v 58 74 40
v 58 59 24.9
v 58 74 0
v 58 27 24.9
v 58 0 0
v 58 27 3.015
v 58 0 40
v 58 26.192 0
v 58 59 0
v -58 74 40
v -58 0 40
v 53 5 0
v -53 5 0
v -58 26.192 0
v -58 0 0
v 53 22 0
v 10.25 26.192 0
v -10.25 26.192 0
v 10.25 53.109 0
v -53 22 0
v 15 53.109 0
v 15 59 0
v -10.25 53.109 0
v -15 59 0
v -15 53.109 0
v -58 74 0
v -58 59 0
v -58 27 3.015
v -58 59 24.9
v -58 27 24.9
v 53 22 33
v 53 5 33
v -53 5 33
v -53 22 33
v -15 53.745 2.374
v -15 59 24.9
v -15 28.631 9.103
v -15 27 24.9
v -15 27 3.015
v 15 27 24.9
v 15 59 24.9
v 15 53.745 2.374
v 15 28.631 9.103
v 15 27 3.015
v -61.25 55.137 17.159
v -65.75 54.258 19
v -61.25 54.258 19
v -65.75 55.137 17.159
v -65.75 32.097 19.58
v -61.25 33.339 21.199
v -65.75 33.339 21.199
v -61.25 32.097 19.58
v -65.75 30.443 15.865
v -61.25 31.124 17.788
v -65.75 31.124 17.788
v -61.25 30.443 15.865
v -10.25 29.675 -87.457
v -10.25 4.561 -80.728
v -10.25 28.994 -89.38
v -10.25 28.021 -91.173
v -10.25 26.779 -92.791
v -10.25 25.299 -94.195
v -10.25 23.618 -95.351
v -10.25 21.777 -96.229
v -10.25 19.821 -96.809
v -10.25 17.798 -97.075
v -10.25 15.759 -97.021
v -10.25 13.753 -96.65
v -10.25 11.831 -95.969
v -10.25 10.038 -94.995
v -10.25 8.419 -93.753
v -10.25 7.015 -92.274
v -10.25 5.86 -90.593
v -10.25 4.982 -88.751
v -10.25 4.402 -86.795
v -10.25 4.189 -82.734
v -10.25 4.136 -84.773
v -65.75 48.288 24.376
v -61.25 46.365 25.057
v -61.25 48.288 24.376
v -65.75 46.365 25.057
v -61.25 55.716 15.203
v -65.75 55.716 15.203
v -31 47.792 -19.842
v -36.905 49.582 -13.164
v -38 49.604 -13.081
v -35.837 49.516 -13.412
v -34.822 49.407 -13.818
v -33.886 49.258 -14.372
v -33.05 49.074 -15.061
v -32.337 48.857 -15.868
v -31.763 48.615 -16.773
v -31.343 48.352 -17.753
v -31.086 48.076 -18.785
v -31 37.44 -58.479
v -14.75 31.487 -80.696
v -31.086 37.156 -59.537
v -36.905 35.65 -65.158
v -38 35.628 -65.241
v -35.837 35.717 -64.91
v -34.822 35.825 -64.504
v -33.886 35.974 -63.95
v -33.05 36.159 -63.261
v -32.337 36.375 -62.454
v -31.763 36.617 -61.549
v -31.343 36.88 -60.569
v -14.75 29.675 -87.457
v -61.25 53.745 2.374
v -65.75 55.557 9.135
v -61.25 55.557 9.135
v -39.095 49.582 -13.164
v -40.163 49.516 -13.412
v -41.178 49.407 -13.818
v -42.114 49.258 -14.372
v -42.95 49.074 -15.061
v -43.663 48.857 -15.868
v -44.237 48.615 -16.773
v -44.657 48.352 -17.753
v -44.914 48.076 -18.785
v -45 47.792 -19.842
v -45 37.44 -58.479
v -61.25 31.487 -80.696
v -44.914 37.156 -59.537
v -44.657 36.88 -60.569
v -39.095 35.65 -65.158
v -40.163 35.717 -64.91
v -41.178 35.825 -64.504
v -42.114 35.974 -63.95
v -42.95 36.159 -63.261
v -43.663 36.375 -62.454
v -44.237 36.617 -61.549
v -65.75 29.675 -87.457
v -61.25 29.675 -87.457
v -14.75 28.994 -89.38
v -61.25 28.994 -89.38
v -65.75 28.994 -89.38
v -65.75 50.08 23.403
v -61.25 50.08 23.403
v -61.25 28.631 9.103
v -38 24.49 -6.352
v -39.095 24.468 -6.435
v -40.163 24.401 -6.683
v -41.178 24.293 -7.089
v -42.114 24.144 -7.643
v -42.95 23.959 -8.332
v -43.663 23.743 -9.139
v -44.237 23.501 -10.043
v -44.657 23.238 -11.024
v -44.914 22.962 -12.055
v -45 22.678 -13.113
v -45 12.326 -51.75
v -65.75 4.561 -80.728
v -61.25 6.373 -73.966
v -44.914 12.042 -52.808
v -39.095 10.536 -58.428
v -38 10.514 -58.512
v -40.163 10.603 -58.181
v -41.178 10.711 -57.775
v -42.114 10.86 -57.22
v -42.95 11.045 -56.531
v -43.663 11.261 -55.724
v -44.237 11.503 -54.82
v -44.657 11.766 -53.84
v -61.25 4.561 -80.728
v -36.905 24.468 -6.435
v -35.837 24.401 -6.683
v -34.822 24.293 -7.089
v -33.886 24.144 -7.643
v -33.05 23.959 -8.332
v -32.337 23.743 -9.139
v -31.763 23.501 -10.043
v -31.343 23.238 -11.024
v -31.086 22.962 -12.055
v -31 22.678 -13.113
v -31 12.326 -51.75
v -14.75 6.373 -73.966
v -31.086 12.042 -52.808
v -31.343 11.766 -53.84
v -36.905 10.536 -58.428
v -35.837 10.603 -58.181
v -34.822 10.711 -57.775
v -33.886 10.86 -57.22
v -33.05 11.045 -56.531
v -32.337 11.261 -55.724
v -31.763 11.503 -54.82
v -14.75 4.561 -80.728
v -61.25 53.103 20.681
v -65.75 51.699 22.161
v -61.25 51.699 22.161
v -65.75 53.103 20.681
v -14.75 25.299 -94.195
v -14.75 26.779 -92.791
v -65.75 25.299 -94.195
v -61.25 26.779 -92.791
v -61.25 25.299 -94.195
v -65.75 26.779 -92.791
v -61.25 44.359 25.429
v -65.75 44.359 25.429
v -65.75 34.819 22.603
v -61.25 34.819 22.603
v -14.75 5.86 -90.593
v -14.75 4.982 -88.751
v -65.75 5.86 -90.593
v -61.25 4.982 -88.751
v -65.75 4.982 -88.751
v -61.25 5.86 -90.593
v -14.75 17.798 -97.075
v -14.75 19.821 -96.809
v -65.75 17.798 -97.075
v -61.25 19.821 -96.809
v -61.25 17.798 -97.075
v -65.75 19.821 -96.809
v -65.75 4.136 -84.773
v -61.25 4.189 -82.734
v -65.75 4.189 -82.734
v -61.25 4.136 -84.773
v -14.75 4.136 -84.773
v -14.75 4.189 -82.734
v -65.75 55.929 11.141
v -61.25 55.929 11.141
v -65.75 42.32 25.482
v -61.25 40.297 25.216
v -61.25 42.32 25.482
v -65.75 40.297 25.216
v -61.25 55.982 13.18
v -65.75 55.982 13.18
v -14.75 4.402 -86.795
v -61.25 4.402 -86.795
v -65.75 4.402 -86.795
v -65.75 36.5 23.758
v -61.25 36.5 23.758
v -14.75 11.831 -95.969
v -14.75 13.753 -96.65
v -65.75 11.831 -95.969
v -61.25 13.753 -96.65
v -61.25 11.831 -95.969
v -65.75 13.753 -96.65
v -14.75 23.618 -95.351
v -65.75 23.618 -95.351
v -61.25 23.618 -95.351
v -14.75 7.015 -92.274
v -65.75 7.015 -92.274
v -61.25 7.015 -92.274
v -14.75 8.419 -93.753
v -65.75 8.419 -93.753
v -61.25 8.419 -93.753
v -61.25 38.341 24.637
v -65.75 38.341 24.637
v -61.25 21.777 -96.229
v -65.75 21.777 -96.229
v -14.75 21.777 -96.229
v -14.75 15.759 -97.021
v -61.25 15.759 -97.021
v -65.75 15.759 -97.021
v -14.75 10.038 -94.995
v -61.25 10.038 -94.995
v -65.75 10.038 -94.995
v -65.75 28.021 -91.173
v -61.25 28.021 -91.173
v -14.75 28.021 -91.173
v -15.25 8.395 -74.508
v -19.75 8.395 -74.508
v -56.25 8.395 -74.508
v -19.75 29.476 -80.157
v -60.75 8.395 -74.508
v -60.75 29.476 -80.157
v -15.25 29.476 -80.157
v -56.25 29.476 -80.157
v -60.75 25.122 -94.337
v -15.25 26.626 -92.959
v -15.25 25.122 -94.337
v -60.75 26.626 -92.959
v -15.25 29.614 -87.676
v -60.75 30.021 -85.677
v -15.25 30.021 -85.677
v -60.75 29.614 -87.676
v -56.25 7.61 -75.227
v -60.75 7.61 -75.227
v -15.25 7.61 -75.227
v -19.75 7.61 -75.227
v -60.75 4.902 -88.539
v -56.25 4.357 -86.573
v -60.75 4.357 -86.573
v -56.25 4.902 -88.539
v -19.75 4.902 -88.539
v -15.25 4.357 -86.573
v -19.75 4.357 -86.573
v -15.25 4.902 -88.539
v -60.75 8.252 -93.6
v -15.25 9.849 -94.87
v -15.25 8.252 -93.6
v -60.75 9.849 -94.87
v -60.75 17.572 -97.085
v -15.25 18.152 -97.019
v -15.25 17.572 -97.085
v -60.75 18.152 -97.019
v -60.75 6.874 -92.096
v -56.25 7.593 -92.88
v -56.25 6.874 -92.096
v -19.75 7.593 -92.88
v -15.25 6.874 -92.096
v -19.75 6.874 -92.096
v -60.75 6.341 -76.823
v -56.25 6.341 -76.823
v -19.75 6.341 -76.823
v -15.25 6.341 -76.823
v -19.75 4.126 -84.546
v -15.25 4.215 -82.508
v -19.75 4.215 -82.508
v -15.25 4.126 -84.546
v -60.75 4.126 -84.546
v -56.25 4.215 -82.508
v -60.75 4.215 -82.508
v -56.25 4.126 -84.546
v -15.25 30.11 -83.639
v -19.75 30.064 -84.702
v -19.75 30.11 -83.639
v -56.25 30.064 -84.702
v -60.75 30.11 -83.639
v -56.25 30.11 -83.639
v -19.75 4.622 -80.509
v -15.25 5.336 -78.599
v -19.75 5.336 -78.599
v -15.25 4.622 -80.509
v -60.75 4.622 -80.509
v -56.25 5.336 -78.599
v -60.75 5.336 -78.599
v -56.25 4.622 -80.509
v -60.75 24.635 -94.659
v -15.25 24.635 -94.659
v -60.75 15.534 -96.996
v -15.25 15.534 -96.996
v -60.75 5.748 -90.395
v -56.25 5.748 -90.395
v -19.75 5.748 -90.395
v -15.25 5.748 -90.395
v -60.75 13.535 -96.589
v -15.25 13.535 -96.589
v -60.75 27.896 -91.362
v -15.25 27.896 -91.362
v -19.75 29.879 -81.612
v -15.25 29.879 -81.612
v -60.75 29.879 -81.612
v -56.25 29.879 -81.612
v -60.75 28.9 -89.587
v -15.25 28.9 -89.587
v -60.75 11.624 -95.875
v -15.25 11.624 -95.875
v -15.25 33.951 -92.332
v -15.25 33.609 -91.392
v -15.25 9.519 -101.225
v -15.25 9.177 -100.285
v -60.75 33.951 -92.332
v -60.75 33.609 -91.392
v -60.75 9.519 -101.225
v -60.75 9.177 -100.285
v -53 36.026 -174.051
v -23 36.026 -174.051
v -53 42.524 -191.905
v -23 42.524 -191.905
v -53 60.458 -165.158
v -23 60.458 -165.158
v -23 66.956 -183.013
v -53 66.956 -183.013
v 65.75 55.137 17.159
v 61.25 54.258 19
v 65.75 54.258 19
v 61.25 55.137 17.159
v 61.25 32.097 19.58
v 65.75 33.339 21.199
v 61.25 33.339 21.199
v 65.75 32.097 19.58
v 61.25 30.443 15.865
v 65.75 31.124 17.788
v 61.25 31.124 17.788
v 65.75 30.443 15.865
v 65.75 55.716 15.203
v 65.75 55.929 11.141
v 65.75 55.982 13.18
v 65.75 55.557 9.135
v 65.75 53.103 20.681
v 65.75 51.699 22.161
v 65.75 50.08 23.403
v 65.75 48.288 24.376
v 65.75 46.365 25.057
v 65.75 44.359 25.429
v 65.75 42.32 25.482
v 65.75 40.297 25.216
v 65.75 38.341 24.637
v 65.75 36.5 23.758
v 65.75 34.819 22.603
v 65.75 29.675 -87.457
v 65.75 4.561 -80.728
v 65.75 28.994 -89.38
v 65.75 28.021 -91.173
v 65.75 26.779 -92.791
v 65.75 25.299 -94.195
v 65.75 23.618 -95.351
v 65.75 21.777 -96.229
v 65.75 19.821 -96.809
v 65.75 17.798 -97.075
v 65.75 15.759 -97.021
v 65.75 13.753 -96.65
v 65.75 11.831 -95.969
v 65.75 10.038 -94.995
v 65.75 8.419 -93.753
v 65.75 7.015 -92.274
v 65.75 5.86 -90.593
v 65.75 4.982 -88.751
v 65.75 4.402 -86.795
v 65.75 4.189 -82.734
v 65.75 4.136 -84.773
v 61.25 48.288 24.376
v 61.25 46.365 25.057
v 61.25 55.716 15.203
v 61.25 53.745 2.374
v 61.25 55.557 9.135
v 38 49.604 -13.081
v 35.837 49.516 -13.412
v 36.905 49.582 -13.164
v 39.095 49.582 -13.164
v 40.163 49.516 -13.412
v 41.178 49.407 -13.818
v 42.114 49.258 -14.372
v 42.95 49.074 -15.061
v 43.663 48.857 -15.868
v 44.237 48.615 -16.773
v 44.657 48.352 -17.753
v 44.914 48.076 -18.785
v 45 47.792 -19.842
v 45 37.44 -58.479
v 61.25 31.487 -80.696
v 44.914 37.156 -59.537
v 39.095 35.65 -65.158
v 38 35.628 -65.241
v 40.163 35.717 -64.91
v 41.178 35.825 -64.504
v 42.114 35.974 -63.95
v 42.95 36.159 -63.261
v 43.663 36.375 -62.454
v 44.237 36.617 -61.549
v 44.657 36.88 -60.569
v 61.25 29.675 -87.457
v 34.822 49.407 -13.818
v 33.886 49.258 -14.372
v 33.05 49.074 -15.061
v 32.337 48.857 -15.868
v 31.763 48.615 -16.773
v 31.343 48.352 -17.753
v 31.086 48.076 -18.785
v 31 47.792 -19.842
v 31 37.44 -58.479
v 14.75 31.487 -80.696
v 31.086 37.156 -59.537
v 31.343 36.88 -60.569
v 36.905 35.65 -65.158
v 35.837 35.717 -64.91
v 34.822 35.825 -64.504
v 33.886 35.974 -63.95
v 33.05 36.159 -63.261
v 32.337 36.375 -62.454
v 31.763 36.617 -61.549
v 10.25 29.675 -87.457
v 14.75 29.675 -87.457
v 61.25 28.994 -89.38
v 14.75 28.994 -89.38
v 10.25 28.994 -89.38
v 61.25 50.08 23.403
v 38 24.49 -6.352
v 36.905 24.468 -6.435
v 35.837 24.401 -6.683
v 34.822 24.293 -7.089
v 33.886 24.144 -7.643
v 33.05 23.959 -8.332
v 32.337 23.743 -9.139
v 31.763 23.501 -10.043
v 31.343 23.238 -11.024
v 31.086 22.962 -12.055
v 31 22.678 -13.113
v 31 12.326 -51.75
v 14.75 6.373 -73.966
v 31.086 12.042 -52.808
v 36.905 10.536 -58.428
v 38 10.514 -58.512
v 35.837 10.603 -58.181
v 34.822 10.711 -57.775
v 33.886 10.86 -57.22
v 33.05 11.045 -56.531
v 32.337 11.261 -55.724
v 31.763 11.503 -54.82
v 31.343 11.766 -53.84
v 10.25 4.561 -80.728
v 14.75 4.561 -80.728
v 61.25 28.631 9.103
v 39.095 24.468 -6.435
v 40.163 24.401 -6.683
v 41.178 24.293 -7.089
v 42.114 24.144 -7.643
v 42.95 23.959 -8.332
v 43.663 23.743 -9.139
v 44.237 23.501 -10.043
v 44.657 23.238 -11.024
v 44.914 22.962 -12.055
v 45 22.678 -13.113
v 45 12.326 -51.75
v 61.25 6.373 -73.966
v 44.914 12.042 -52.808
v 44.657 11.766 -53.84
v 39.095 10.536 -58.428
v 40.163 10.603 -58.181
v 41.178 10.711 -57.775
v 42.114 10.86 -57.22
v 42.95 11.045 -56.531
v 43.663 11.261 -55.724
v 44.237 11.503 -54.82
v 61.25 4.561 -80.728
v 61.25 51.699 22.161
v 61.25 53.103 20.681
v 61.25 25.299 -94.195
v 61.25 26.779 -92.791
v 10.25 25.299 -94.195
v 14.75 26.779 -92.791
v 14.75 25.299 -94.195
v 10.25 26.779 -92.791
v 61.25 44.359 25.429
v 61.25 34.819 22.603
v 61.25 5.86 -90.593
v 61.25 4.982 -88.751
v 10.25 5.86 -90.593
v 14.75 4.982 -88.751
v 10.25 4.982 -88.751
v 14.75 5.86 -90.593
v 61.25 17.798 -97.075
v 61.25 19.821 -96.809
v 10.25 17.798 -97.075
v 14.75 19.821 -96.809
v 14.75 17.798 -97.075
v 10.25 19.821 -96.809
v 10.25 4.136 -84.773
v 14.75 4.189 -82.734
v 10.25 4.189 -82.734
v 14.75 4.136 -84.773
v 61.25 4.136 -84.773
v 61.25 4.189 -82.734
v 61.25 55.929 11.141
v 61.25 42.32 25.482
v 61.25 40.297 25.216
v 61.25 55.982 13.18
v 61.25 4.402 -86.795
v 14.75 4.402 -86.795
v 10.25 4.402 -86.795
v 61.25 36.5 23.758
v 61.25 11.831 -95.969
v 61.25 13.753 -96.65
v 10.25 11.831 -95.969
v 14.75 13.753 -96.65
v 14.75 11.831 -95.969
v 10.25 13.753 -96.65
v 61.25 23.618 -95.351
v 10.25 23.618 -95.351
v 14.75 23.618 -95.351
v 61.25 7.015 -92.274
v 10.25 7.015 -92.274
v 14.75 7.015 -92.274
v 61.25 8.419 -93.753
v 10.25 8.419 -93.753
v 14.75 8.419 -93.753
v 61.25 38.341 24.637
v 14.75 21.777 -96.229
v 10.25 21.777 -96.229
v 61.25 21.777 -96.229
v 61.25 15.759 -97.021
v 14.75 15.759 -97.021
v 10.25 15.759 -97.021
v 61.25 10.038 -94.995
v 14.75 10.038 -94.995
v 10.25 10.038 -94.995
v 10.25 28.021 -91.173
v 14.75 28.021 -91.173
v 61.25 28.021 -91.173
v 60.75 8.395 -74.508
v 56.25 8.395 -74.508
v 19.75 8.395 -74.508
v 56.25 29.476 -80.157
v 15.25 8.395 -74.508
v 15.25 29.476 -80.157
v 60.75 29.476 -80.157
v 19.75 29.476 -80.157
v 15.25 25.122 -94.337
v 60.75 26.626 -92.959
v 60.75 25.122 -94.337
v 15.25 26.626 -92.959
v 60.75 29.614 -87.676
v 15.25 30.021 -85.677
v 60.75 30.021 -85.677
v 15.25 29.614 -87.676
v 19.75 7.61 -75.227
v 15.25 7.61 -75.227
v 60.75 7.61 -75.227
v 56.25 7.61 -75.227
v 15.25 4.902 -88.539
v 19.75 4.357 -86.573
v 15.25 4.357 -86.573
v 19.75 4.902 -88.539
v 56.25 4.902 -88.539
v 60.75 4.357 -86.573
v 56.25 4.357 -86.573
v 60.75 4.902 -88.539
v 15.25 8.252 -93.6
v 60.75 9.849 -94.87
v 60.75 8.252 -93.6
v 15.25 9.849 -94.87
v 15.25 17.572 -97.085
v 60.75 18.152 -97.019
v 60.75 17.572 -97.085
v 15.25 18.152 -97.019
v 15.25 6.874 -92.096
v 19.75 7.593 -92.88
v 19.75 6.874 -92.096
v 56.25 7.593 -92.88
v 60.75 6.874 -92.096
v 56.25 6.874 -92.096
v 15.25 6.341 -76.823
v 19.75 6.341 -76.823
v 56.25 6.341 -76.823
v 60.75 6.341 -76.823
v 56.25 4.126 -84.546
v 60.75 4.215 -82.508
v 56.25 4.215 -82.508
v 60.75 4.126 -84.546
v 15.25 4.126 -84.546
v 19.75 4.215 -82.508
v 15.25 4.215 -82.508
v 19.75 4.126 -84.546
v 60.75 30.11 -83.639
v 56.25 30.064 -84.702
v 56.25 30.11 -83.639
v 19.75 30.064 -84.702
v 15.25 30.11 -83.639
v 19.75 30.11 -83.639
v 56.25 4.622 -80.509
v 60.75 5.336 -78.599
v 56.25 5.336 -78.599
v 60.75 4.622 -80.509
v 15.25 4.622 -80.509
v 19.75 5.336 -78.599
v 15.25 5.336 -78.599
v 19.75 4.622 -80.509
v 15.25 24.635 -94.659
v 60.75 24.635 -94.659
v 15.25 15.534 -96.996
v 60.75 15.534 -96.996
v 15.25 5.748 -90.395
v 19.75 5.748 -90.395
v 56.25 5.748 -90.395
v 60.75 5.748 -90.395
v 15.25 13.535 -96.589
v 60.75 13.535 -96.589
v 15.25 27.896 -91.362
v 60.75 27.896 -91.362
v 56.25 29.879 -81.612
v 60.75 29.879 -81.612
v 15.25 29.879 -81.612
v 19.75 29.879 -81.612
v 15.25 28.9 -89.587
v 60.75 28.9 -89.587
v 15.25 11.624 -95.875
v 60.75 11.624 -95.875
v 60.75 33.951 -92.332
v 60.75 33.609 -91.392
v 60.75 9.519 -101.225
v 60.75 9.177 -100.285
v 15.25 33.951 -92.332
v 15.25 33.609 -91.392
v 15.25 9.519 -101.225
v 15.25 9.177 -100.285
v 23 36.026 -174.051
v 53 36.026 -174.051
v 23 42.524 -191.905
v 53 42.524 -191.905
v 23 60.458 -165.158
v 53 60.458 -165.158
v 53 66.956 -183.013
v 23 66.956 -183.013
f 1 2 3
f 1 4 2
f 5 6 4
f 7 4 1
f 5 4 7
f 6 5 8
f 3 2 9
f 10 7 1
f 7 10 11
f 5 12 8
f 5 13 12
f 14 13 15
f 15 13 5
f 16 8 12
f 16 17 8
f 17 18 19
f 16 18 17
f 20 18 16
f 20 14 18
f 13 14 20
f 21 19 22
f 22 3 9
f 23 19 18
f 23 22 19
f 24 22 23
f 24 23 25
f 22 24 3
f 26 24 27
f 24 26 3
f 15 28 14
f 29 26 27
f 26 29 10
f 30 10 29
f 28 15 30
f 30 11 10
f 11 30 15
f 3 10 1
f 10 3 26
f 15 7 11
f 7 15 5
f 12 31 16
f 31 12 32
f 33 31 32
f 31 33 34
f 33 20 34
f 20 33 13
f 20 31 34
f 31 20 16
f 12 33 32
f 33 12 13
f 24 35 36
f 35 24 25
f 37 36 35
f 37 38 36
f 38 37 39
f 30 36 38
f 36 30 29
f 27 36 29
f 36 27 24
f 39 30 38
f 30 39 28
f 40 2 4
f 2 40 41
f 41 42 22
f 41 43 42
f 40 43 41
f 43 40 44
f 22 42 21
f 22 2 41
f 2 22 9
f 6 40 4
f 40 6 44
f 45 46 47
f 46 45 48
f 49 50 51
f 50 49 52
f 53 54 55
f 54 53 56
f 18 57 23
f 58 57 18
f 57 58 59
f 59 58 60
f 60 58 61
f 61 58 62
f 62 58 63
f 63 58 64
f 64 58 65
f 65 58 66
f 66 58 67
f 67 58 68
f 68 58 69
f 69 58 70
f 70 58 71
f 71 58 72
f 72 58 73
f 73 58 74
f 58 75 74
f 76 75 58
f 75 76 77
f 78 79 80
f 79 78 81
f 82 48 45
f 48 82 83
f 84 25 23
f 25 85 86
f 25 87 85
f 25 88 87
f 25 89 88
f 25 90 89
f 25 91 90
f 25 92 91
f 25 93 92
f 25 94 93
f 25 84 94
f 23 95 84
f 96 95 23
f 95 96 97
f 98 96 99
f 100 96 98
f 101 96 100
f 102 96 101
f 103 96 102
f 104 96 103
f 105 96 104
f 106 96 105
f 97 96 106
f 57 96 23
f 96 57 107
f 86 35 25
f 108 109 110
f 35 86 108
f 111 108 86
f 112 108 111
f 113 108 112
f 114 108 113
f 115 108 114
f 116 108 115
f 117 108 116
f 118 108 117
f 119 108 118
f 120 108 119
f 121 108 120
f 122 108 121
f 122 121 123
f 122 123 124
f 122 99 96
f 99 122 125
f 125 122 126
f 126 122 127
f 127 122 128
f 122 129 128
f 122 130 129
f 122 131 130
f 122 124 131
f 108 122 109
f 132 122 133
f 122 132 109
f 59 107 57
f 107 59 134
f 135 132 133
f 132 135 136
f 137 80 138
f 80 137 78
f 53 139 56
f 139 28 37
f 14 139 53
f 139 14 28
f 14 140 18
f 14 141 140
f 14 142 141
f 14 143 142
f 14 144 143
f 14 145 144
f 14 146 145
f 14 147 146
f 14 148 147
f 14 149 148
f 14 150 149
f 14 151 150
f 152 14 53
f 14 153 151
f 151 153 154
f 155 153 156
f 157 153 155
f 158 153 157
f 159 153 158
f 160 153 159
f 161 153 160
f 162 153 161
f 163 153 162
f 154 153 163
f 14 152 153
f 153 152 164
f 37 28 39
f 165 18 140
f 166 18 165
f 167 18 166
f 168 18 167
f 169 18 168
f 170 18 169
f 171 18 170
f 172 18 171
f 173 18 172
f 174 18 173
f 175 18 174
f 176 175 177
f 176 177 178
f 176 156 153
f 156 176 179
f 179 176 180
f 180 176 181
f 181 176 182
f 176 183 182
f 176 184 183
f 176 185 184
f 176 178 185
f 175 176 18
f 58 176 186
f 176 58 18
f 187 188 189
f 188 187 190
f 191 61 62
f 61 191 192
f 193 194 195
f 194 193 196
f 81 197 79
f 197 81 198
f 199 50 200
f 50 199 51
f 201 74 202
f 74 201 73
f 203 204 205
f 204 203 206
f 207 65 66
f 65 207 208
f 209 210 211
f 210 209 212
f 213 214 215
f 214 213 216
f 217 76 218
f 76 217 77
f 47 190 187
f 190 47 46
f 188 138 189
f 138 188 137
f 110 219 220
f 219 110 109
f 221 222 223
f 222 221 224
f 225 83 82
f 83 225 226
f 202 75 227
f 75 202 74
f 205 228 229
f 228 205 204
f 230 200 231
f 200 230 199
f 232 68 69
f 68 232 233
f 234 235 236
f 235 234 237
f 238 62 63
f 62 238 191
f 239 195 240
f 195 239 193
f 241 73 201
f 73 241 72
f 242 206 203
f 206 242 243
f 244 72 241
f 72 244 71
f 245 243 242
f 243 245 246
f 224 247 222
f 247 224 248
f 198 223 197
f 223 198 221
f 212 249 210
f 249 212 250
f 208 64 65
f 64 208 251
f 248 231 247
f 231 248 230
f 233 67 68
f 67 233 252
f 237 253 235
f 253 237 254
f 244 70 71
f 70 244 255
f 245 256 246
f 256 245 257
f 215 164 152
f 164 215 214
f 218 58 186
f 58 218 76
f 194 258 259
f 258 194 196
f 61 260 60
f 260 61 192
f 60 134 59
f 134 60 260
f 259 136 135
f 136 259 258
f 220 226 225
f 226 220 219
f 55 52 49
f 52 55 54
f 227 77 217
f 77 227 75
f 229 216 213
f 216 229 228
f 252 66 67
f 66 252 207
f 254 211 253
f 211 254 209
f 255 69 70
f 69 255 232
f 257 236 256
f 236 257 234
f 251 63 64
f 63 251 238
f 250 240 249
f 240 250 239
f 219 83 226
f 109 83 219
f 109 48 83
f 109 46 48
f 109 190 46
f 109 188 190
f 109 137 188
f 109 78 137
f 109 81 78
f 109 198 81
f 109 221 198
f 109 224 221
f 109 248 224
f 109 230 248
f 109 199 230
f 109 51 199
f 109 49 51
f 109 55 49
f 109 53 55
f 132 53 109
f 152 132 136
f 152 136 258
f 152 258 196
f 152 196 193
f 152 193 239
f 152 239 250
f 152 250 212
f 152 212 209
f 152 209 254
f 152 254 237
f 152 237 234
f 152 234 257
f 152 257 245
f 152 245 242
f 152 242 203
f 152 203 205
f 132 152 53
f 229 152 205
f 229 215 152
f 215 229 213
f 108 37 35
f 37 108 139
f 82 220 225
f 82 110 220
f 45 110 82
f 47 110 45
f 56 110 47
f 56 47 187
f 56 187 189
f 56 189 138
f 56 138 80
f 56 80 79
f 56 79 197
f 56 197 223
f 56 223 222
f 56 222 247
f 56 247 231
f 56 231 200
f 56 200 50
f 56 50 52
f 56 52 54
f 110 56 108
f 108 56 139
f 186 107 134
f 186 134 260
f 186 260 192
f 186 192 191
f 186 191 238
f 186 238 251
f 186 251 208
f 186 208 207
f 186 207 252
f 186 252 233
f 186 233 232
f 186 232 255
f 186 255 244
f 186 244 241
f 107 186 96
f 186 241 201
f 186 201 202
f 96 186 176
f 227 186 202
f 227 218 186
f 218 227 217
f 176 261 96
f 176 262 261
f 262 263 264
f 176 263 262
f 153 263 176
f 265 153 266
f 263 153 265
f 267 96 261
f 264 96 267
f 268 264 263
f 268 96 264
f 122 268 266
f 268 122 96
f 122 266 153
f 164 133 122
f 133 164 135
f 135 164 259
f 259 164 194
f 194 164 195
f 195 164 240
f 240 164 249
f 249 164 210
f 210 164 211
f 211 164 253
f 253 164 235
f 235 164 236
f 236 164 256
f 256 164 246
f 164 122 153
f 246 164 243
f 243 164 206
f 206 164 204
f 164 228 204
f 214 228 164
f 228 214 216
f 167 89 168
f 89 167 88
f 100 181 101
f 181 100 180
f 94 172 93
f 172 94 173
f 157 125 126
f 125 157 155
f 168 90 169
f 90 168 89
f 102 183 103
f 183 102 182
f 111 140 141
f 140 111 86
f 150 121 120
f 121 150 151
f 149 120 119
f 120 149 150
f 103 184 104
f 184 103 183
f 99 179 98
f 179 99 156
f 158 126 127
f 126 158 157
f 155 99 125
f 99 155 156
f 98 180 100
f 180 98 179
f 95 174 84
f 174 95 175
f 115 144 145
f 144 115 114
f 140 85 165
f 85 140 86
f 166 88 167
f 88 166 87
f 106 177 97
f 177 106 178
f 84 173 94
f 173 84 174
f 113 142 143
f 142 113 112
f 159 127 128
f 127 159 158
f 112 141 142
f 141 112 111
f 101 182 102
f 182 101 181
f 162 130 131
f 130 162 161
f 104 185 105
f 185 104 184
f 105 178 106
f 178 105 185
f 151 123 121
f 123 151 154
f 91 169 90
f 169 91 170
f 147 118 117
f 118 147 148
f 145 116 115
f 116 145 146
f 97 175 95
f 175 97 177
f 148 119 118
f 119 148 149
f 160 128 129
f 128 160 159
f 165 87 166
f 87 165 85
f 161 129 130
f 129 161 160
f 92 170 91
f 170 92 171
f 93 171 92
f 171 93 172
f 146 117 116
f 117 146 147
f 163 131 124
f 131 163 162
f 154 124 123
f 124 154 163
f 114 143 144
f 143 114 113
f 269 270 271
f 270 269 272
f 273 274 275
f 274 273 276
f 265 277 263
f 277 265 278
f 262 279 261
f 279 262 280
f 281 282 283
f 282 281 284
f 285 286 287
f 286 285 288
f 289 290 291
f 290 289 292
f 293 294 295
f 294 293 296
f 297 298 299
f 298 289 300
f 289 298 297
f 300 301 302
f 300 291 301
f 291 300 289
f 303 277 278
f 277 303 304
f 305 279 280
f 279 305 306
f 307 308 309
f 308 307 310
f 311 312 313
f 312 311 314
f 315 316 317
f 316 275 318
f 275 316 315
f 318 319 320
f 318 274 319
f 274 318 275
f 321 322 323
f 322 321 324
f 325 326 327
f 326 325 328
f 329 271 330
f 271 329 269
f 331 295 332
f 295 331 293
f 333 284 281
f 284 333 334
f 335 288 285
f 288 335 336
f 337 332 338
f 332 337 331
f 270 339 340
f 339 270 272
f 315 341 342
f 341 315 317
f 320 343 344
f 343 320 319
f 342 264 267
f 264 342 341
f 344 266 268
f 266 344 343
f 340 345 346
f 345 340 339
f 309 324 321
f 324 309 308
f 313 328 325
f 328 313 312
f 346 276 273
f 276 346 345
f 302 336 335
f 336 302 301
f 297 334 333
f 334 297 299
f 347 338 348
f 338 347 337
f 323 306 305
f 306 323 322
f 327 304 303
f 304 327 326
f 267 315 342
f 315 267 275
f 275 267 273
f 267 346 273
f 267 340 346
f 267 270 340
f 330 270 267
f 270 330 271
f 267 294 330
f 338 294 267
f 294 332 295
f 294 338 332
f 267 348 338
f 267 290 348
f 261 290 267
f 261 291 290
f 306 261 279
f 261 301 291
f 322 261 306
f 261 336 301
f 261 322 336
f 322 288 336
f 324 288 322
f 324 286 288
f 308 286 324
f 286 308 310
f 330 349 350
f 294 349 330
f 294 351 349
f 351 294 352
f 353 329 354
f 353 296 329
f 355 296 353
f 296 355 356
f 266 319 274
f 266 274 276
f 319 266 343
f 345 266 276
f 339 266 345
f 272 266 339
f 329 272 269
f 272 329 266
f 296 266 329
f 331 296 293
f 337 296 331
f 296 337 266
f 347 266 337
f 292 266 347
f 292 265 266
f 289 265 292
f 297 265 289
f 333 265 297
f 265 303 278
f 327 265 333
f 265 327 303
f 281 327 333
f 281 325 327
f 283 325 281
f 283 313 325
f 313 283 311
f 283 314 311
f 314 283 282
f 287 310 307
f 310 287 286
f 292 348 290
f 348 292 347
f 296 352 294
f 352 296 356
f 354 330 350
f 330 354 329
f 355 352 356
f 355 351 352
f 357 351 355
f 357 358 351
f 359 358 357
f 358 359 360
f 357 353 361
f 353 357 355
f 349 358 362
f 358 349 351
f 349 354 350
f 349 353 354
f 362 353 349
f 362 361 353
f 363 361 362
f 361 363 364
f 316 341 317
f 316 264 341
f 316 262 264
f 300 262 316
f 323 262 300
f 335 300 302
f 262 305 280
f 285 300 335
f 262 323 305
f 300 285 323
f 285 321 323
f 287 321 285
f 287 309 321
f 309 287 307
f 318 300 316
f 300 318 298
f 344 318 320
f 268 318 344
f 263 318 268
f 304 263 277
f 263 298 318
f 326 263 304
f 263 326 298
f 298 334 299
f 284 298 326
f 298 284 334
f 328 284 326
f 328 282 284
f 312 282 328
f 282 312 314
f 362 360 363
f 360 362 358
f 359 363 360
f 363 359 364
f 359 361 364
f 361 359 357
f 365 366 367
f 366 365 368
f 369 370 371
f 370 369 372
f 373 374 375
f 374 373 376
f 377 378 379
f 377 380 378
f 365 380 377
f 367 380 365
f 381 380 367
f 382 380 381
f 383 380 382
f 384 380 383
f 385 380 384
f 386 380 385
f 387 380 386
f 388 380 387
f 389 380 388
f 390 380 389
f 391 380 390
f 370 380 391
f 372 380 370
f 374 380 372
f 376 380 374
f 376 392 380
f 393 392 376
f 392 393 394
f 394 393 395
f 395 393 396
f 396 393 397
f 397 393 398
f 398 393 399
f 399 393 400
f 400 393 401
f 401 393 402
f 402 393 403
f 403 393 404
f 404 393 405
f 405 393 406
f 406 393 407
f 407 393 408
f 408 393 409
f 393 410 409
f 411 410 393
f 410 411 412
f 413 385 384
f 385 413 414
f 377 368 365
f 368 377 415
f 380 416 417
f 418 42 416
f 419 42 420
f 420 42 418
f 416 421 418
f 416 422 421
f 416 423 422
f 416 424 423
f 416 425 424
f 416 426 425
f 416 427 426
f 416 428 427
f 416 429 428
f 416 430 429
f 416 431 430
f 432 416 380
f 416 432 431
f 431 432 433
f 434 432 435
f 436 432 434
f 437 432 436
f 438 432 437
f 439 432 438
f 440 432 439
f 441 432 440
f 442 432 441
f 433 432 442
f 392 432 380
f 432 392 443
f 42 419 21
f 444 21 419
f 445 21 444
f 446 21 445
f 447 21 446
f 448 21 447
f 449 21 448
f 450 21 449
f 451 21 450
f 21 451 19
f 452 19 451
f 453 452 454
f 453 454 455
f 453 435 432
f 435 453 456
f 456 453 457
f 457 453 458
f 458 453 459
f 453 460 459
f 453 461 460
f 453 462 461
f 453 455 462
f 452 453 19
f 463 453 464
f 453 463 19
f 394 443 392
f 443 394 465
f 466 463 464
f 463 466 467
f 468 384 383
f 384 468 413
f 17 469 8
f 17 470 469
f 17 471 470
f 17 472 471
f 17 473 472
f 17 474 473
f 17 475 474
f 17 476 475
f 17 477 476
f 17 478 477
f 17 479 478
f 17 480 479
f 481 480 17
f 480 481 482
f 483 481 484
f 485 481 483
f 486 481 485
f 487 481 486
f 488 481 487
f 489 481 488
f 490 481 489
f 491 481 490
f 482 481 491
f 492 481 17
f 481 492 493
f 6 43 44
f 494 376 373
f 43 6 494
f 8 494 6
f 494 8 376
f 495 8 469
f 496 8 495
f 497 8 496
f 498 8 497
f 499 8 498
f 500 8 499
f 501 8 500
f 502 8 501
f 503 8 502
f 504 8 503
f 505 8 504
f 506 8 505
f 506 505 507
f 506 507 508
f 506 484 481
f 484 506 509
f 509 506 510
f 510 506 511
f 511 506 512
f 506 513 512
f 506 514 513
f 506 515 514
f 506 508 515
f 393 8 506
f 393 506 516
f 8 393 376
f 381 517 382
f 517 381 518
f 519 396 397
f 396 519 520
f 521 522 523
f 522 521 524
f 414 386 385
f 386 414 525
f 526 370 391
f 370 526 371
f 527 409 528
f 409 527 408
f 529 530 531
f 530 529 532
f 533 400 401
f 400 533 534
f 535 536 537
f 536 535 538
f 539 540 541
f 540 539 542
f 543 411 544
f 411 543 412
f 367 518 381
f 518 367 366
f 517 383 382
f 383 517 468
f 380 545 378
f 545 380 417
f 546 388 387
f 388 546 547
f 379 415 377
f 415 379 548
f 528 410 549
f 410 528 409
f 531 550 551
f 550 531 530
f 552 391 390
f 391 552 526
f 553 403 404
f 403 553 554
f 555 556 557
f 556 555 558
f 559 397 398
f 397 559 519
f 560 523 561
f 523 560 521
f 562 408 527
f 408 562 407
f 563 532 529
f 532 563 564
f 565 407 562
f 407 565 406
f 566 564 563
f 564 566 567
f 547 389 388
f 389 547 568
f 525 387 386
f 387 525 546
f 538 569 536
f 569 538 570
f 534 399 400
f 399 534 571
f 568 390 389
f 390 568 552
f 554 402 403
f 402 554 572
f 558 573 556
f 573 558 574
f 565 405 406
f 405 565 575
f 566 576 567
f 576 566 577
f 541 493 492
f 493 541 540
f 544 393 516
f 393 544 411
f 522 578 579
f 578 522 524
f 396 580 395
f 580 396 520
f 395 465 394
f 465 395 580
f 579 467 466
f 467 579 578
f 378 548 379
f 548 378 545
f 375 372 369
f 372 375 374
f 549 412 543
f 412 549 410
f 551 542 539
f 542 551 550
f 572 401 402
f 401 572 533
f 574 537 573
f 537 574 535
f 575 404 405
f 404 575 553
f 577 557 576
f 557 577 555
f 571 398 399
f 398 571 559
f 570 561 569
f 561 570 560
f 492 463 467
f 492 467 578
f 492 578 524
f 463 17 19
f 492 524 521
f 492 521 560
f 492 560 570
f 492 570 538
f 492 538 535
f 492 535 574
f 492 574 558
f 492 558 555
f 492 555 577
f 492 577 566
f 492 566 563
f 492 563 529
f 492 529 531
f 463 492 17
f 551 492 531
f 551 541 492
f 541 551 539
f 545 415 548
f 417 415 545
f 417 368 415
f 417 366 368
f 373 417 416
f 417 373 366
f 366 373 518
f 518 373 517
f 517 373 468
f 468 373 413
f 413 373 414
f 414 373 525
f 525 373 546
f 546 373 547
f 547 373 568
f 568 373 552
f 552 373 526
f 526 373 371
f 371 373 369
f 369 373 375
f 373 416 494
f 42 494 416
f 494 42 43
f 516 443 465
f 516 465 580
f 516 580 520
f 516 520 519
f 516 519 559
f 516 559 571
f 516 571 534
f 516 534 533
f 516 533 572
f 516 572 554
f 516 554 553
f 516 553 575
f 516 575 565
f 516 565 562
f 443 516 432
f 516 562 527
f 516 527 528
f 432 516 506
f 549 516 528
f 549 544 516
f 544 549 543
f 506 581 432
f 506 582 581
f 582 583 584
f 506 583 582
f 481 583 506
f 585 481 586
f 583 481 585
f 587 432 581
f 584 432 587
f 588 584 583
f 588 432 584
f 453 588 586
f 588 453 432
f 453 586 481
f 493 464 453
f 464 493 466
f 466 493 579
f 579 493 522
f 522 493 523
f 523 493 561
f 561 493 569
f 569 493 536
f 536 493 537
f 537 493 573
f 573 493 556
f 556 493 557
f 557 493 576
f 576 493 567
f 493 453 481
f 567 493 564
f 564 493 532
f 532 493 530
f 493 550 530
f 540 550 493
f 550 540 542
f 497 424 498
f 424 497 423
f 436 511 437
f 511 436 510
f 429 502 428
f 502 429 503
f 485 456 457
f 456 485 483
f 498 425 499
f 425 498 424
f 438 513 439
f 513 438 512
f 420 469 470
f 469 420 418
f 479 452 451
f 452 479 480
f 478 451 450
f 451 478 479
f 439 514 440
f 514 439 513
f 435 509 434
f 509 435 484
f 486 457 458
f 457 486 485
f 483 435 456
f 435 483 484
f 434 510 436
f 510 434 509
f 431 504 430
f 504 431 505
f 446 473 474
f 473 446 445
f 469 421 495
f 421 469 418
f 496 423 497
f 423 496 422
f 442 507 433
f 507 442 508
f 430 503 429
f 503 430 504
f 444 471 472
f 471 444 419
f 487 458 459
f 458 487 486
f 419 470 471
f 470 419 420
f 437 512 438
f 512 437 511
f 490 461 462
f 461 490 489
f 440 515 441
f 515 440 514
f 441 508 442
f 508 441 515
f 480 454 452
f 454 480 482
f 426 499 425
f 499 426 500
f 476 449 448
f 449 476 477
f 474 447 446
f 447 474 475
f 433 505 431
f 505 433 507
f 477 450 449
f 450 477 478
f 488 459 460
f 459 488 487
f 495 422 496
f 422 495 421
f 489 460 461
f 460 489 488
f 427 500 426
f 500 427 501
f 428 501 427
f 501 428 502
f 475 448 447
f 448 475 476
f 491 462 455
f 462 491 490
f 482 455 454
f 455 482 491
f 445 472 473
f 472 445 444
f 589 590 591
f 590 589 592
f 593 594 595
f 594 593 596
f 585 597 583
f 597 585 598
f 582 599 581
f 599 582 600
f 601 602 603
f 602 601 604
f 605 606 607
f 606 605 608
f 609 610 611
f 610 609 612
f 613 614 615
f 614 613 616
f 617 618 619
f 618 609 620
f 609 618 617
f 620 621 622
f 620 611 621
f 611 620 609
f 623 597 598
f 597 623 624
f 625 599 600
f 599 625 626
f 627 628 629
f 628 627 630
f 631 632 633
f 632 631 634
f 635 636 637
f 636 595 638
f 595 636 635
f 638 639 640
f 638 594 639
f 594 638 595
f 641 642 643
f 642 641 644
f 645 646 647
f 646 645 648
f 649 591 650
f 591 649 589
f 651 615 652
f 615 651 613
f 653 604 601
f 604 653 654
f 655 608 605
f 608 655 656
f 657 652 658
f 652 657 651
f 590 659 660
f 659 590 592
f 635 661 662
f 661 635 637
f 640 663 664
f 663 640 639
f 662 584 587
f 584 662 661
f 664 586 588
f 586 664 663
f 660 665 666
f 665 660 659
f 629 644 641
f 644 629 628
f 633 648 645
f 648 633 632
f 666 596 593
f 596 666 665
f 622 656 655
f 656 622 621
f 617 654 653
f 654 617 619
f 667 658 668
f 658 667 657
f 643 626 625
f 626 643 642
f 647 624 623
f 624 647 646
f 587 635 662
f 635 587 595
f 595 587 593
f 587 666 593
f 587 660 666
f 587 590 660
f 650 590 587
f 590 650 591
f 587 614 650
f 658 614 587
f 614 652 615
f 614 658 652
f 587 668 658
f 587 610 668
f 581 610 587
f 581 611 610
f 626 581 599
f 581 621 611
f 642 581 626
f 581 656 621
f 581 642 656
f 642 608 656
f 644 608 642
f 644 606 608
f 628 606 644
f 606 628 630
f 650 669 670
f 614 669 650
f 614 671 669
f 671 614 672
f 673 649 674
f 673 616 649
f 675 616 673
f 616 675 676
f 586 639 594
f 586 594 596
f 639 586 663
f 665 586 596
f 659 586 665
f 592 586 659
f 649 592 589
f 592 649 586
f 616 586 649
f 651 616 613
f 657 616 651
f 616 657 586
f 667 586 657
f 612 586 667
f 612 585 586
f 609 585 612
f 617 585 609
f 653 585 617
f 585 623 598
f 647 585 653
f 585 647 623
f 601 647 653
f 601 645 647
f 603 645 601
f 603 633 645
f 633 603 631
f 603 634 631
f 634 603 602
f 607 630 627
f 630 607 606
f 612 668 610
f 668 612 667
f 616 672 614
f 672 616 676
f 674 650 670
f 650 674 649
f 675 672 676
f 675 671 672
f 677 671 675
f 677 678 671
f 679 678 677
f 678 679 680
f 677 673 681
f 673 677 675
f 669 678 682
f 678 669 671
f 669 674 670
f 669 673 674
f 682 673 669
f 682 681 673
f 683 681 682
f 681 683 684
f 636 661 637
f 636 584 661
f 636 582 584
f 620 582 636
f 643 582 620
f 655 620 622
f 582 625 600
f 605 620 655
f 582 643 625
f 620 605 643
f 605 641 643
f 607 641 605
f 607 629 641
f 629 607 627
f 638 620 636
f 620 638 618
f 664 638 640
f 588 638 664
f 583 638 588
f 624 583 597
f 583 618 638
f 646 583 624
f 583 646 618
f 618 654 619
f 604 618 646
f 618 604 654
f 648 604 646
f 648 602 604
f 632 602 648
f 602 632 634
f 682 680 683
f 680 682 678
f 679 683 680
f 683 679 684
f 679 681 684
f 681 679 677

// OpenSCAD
// 🤖 Mini-Atlas V1 - 下肢总成参数化完整装配图 (Full Leg Assembly)
// ====================================================================
$fn = 40; // 渲染圆滑度

// ====== 【核心控制开关：直接在这里修改角度，可以让腿动起来！】 ======
hip_pitch  = -15;  // 髋关节前屈角度 (度) -> 调整看大腿摆动
knee_pitch = 35;   // 膝关节弯曲角度 (度) -> 调整看大腿和小腿嵌套

// ==================== 1. 基础全局参数定义 ====================
pelvis_w = 116; pelvis_h = 74; pelvis_d = 40;
leg_length_thigh = 100; // 大腿长
leg_length_calf  = 90;  // 小腿长

u_inner = 46.5; // 舵机及小腿内侧净宽
wall_t  = 4.5;  // 支架侧壁厚
u_outer = u_inner + 2 * wall_t; // 大腿外宽 (55.5mm)

// ==================== 2. 独立结构件组件库 ====================

// 🧩 部件 A：骨盆核心舱 (灰色)
module pelvis() {
    difference() {
        // 圆角骨盆外壳
        translate([0, pelvis_h/2, pelvis_d/2]) 
            cube([pelvis_w, pelvis_h, pelvis_d], center=true);
        // 底部电池通槽
        translate([0, 17/2 + 5, 16/2]) 
            cube([106, 17, 50], center=true);
        // 左侧髋关节舵机盲槽 (位于 X = -38 处)
        translate([-38, 27 + 32/2, 25/2 - 0.1]) 
            cube([46, 32, 25], center=true);
        // 右侧髋关节舵机盲槽 (位于 X = 38 处)
        translate([38, 27 + 32/2, 25/2 - 0.1]) 
            cube([46, 32, 25], center=true);
    }
}

// 🧩 部件 B：大腿 U 型支撑架 (蓝色)
// 亮点：上下都是开口朝下的 U 型叉，外包络结构
module thigh() {
    difference() {
        // 大腿骨骼毛坯
        hull() {
            rotate([0, 90, 0]) cylinder(r=13, h=u_outer, center=true);
            translate([0, 0, -leg_length_thigh]) rotate([0, 90, 0]) cylinder(r=13, h=u_outer, center=true);
        }
        // 顶部 U 型切口：用来水平夹住骨盆侧壁
        translate([0, 0, 13]) cube([u_inner, 40, 40], center=true);
        // 底部 U 型切口：开口朝下，用来外包包裹住小腿顶部！
        translate([0, 0, -leg_length_thigh - 13]) cube([u_inner, 40, 40], center=true);
        // 中间骨骼拓扑减重槽
        translate([0, 0, -leg_length_thigh/2]) rotate([90, 0, 0])
            hull() {
                translate([0, 20, 0]) cylinder(d=14, h=50, center=true);
                translate([0, -20, 0]) cylinder(d=14, h=50, center=true);
            }
    }
}

// 🧩 部件 C：小腿承重组件 (绿色)
// 亮点：顶部是开口向上的 U 型仓，外壁宽度刚好塞进大腿的下 U 型叉内
module calf() {
    difference() {
        union() {
            // 顶部膝关节旋转头 (外宽为 45.5mm，完美嵌入大腿的 46.5mm 内宽中)
            rotate([0, 90, 0]) cylinder(r=13, h=u_inner - 1, center=true);
            // 向下收拢的骨骼主体
            hull() {
                translate([0, 0, -13]) cube([u_inner - 1, 26, 1], center=true);
                translate([0, 0, -leg_length_calf]) cube([30, 26, 2], center=true);
            }
        }
        // 顶部开口向上的 U 型槽 (用来在内部塞入它自己的膝关节舵机)
        translate([0, 0, 5]) cube([36.5, 32, 20], center=true);
    }
    // 底部固定的脚踝电机转接座 (黑色)
    color("Charcoal") translate([0, 0, -leg_length_calf - 10]) 
        cube([30, 26, 20], center=true);
}


// ==================== 3. 核心物理拓扑装配中心 ====================

// 1️⃣ 放置中心基座：骨盆
color("LightSlateGray") pelvis();

// 2️⃣ 组装左下肢 (面向机器人时的左侧)
translate([-38, 27 + 16, 25/2]) {   // 第一步：将坐标系移动到【左髋关节轴心】
    rotate([hip_pitch, 0, 0]) {     // 第二步：绕着 X 轴水平旋转 (髋关节前屈/后摆)
        
        color("RoyalBlue") thigh();  // 第三步：在此坐标系下渲染大腿
        
        // ──────────────────────────────────────────────────
        translate([0, 0, -leg_length_thigh]) {  // 第四步：顺着大腿骨向下移动到【膝关节轴心】
            rotate([knee_pitch, 0, 0]) {        // 第五步：绕着 X 轴水平旋转 (膝关节屈伸)
                
                color("LimeGreen") calf();     // 第六步：在此坐标系下渲染小腿与脚踝
                
            }
        }
        // ──────────────────────────────────────────────────
    }
}

// 3️⃣ 组装右下肢 (完全对称，镜像共用组件)
translate([38, 27 + 16, 25/2]) {    // 移动到【右髋关节轴心】
    rotate([hip_pitch, 0, 0]) {     // 髋关节同步联动
        color("RoyalBlue") thigh(); 
        
        translate([0, 0, -leg_length_thigh]) {
            rotate([knee_pitch, 0, 0]) { // 膝关节同步联动
                color("LimeGreen") calf();
            }
        }
    }
}
